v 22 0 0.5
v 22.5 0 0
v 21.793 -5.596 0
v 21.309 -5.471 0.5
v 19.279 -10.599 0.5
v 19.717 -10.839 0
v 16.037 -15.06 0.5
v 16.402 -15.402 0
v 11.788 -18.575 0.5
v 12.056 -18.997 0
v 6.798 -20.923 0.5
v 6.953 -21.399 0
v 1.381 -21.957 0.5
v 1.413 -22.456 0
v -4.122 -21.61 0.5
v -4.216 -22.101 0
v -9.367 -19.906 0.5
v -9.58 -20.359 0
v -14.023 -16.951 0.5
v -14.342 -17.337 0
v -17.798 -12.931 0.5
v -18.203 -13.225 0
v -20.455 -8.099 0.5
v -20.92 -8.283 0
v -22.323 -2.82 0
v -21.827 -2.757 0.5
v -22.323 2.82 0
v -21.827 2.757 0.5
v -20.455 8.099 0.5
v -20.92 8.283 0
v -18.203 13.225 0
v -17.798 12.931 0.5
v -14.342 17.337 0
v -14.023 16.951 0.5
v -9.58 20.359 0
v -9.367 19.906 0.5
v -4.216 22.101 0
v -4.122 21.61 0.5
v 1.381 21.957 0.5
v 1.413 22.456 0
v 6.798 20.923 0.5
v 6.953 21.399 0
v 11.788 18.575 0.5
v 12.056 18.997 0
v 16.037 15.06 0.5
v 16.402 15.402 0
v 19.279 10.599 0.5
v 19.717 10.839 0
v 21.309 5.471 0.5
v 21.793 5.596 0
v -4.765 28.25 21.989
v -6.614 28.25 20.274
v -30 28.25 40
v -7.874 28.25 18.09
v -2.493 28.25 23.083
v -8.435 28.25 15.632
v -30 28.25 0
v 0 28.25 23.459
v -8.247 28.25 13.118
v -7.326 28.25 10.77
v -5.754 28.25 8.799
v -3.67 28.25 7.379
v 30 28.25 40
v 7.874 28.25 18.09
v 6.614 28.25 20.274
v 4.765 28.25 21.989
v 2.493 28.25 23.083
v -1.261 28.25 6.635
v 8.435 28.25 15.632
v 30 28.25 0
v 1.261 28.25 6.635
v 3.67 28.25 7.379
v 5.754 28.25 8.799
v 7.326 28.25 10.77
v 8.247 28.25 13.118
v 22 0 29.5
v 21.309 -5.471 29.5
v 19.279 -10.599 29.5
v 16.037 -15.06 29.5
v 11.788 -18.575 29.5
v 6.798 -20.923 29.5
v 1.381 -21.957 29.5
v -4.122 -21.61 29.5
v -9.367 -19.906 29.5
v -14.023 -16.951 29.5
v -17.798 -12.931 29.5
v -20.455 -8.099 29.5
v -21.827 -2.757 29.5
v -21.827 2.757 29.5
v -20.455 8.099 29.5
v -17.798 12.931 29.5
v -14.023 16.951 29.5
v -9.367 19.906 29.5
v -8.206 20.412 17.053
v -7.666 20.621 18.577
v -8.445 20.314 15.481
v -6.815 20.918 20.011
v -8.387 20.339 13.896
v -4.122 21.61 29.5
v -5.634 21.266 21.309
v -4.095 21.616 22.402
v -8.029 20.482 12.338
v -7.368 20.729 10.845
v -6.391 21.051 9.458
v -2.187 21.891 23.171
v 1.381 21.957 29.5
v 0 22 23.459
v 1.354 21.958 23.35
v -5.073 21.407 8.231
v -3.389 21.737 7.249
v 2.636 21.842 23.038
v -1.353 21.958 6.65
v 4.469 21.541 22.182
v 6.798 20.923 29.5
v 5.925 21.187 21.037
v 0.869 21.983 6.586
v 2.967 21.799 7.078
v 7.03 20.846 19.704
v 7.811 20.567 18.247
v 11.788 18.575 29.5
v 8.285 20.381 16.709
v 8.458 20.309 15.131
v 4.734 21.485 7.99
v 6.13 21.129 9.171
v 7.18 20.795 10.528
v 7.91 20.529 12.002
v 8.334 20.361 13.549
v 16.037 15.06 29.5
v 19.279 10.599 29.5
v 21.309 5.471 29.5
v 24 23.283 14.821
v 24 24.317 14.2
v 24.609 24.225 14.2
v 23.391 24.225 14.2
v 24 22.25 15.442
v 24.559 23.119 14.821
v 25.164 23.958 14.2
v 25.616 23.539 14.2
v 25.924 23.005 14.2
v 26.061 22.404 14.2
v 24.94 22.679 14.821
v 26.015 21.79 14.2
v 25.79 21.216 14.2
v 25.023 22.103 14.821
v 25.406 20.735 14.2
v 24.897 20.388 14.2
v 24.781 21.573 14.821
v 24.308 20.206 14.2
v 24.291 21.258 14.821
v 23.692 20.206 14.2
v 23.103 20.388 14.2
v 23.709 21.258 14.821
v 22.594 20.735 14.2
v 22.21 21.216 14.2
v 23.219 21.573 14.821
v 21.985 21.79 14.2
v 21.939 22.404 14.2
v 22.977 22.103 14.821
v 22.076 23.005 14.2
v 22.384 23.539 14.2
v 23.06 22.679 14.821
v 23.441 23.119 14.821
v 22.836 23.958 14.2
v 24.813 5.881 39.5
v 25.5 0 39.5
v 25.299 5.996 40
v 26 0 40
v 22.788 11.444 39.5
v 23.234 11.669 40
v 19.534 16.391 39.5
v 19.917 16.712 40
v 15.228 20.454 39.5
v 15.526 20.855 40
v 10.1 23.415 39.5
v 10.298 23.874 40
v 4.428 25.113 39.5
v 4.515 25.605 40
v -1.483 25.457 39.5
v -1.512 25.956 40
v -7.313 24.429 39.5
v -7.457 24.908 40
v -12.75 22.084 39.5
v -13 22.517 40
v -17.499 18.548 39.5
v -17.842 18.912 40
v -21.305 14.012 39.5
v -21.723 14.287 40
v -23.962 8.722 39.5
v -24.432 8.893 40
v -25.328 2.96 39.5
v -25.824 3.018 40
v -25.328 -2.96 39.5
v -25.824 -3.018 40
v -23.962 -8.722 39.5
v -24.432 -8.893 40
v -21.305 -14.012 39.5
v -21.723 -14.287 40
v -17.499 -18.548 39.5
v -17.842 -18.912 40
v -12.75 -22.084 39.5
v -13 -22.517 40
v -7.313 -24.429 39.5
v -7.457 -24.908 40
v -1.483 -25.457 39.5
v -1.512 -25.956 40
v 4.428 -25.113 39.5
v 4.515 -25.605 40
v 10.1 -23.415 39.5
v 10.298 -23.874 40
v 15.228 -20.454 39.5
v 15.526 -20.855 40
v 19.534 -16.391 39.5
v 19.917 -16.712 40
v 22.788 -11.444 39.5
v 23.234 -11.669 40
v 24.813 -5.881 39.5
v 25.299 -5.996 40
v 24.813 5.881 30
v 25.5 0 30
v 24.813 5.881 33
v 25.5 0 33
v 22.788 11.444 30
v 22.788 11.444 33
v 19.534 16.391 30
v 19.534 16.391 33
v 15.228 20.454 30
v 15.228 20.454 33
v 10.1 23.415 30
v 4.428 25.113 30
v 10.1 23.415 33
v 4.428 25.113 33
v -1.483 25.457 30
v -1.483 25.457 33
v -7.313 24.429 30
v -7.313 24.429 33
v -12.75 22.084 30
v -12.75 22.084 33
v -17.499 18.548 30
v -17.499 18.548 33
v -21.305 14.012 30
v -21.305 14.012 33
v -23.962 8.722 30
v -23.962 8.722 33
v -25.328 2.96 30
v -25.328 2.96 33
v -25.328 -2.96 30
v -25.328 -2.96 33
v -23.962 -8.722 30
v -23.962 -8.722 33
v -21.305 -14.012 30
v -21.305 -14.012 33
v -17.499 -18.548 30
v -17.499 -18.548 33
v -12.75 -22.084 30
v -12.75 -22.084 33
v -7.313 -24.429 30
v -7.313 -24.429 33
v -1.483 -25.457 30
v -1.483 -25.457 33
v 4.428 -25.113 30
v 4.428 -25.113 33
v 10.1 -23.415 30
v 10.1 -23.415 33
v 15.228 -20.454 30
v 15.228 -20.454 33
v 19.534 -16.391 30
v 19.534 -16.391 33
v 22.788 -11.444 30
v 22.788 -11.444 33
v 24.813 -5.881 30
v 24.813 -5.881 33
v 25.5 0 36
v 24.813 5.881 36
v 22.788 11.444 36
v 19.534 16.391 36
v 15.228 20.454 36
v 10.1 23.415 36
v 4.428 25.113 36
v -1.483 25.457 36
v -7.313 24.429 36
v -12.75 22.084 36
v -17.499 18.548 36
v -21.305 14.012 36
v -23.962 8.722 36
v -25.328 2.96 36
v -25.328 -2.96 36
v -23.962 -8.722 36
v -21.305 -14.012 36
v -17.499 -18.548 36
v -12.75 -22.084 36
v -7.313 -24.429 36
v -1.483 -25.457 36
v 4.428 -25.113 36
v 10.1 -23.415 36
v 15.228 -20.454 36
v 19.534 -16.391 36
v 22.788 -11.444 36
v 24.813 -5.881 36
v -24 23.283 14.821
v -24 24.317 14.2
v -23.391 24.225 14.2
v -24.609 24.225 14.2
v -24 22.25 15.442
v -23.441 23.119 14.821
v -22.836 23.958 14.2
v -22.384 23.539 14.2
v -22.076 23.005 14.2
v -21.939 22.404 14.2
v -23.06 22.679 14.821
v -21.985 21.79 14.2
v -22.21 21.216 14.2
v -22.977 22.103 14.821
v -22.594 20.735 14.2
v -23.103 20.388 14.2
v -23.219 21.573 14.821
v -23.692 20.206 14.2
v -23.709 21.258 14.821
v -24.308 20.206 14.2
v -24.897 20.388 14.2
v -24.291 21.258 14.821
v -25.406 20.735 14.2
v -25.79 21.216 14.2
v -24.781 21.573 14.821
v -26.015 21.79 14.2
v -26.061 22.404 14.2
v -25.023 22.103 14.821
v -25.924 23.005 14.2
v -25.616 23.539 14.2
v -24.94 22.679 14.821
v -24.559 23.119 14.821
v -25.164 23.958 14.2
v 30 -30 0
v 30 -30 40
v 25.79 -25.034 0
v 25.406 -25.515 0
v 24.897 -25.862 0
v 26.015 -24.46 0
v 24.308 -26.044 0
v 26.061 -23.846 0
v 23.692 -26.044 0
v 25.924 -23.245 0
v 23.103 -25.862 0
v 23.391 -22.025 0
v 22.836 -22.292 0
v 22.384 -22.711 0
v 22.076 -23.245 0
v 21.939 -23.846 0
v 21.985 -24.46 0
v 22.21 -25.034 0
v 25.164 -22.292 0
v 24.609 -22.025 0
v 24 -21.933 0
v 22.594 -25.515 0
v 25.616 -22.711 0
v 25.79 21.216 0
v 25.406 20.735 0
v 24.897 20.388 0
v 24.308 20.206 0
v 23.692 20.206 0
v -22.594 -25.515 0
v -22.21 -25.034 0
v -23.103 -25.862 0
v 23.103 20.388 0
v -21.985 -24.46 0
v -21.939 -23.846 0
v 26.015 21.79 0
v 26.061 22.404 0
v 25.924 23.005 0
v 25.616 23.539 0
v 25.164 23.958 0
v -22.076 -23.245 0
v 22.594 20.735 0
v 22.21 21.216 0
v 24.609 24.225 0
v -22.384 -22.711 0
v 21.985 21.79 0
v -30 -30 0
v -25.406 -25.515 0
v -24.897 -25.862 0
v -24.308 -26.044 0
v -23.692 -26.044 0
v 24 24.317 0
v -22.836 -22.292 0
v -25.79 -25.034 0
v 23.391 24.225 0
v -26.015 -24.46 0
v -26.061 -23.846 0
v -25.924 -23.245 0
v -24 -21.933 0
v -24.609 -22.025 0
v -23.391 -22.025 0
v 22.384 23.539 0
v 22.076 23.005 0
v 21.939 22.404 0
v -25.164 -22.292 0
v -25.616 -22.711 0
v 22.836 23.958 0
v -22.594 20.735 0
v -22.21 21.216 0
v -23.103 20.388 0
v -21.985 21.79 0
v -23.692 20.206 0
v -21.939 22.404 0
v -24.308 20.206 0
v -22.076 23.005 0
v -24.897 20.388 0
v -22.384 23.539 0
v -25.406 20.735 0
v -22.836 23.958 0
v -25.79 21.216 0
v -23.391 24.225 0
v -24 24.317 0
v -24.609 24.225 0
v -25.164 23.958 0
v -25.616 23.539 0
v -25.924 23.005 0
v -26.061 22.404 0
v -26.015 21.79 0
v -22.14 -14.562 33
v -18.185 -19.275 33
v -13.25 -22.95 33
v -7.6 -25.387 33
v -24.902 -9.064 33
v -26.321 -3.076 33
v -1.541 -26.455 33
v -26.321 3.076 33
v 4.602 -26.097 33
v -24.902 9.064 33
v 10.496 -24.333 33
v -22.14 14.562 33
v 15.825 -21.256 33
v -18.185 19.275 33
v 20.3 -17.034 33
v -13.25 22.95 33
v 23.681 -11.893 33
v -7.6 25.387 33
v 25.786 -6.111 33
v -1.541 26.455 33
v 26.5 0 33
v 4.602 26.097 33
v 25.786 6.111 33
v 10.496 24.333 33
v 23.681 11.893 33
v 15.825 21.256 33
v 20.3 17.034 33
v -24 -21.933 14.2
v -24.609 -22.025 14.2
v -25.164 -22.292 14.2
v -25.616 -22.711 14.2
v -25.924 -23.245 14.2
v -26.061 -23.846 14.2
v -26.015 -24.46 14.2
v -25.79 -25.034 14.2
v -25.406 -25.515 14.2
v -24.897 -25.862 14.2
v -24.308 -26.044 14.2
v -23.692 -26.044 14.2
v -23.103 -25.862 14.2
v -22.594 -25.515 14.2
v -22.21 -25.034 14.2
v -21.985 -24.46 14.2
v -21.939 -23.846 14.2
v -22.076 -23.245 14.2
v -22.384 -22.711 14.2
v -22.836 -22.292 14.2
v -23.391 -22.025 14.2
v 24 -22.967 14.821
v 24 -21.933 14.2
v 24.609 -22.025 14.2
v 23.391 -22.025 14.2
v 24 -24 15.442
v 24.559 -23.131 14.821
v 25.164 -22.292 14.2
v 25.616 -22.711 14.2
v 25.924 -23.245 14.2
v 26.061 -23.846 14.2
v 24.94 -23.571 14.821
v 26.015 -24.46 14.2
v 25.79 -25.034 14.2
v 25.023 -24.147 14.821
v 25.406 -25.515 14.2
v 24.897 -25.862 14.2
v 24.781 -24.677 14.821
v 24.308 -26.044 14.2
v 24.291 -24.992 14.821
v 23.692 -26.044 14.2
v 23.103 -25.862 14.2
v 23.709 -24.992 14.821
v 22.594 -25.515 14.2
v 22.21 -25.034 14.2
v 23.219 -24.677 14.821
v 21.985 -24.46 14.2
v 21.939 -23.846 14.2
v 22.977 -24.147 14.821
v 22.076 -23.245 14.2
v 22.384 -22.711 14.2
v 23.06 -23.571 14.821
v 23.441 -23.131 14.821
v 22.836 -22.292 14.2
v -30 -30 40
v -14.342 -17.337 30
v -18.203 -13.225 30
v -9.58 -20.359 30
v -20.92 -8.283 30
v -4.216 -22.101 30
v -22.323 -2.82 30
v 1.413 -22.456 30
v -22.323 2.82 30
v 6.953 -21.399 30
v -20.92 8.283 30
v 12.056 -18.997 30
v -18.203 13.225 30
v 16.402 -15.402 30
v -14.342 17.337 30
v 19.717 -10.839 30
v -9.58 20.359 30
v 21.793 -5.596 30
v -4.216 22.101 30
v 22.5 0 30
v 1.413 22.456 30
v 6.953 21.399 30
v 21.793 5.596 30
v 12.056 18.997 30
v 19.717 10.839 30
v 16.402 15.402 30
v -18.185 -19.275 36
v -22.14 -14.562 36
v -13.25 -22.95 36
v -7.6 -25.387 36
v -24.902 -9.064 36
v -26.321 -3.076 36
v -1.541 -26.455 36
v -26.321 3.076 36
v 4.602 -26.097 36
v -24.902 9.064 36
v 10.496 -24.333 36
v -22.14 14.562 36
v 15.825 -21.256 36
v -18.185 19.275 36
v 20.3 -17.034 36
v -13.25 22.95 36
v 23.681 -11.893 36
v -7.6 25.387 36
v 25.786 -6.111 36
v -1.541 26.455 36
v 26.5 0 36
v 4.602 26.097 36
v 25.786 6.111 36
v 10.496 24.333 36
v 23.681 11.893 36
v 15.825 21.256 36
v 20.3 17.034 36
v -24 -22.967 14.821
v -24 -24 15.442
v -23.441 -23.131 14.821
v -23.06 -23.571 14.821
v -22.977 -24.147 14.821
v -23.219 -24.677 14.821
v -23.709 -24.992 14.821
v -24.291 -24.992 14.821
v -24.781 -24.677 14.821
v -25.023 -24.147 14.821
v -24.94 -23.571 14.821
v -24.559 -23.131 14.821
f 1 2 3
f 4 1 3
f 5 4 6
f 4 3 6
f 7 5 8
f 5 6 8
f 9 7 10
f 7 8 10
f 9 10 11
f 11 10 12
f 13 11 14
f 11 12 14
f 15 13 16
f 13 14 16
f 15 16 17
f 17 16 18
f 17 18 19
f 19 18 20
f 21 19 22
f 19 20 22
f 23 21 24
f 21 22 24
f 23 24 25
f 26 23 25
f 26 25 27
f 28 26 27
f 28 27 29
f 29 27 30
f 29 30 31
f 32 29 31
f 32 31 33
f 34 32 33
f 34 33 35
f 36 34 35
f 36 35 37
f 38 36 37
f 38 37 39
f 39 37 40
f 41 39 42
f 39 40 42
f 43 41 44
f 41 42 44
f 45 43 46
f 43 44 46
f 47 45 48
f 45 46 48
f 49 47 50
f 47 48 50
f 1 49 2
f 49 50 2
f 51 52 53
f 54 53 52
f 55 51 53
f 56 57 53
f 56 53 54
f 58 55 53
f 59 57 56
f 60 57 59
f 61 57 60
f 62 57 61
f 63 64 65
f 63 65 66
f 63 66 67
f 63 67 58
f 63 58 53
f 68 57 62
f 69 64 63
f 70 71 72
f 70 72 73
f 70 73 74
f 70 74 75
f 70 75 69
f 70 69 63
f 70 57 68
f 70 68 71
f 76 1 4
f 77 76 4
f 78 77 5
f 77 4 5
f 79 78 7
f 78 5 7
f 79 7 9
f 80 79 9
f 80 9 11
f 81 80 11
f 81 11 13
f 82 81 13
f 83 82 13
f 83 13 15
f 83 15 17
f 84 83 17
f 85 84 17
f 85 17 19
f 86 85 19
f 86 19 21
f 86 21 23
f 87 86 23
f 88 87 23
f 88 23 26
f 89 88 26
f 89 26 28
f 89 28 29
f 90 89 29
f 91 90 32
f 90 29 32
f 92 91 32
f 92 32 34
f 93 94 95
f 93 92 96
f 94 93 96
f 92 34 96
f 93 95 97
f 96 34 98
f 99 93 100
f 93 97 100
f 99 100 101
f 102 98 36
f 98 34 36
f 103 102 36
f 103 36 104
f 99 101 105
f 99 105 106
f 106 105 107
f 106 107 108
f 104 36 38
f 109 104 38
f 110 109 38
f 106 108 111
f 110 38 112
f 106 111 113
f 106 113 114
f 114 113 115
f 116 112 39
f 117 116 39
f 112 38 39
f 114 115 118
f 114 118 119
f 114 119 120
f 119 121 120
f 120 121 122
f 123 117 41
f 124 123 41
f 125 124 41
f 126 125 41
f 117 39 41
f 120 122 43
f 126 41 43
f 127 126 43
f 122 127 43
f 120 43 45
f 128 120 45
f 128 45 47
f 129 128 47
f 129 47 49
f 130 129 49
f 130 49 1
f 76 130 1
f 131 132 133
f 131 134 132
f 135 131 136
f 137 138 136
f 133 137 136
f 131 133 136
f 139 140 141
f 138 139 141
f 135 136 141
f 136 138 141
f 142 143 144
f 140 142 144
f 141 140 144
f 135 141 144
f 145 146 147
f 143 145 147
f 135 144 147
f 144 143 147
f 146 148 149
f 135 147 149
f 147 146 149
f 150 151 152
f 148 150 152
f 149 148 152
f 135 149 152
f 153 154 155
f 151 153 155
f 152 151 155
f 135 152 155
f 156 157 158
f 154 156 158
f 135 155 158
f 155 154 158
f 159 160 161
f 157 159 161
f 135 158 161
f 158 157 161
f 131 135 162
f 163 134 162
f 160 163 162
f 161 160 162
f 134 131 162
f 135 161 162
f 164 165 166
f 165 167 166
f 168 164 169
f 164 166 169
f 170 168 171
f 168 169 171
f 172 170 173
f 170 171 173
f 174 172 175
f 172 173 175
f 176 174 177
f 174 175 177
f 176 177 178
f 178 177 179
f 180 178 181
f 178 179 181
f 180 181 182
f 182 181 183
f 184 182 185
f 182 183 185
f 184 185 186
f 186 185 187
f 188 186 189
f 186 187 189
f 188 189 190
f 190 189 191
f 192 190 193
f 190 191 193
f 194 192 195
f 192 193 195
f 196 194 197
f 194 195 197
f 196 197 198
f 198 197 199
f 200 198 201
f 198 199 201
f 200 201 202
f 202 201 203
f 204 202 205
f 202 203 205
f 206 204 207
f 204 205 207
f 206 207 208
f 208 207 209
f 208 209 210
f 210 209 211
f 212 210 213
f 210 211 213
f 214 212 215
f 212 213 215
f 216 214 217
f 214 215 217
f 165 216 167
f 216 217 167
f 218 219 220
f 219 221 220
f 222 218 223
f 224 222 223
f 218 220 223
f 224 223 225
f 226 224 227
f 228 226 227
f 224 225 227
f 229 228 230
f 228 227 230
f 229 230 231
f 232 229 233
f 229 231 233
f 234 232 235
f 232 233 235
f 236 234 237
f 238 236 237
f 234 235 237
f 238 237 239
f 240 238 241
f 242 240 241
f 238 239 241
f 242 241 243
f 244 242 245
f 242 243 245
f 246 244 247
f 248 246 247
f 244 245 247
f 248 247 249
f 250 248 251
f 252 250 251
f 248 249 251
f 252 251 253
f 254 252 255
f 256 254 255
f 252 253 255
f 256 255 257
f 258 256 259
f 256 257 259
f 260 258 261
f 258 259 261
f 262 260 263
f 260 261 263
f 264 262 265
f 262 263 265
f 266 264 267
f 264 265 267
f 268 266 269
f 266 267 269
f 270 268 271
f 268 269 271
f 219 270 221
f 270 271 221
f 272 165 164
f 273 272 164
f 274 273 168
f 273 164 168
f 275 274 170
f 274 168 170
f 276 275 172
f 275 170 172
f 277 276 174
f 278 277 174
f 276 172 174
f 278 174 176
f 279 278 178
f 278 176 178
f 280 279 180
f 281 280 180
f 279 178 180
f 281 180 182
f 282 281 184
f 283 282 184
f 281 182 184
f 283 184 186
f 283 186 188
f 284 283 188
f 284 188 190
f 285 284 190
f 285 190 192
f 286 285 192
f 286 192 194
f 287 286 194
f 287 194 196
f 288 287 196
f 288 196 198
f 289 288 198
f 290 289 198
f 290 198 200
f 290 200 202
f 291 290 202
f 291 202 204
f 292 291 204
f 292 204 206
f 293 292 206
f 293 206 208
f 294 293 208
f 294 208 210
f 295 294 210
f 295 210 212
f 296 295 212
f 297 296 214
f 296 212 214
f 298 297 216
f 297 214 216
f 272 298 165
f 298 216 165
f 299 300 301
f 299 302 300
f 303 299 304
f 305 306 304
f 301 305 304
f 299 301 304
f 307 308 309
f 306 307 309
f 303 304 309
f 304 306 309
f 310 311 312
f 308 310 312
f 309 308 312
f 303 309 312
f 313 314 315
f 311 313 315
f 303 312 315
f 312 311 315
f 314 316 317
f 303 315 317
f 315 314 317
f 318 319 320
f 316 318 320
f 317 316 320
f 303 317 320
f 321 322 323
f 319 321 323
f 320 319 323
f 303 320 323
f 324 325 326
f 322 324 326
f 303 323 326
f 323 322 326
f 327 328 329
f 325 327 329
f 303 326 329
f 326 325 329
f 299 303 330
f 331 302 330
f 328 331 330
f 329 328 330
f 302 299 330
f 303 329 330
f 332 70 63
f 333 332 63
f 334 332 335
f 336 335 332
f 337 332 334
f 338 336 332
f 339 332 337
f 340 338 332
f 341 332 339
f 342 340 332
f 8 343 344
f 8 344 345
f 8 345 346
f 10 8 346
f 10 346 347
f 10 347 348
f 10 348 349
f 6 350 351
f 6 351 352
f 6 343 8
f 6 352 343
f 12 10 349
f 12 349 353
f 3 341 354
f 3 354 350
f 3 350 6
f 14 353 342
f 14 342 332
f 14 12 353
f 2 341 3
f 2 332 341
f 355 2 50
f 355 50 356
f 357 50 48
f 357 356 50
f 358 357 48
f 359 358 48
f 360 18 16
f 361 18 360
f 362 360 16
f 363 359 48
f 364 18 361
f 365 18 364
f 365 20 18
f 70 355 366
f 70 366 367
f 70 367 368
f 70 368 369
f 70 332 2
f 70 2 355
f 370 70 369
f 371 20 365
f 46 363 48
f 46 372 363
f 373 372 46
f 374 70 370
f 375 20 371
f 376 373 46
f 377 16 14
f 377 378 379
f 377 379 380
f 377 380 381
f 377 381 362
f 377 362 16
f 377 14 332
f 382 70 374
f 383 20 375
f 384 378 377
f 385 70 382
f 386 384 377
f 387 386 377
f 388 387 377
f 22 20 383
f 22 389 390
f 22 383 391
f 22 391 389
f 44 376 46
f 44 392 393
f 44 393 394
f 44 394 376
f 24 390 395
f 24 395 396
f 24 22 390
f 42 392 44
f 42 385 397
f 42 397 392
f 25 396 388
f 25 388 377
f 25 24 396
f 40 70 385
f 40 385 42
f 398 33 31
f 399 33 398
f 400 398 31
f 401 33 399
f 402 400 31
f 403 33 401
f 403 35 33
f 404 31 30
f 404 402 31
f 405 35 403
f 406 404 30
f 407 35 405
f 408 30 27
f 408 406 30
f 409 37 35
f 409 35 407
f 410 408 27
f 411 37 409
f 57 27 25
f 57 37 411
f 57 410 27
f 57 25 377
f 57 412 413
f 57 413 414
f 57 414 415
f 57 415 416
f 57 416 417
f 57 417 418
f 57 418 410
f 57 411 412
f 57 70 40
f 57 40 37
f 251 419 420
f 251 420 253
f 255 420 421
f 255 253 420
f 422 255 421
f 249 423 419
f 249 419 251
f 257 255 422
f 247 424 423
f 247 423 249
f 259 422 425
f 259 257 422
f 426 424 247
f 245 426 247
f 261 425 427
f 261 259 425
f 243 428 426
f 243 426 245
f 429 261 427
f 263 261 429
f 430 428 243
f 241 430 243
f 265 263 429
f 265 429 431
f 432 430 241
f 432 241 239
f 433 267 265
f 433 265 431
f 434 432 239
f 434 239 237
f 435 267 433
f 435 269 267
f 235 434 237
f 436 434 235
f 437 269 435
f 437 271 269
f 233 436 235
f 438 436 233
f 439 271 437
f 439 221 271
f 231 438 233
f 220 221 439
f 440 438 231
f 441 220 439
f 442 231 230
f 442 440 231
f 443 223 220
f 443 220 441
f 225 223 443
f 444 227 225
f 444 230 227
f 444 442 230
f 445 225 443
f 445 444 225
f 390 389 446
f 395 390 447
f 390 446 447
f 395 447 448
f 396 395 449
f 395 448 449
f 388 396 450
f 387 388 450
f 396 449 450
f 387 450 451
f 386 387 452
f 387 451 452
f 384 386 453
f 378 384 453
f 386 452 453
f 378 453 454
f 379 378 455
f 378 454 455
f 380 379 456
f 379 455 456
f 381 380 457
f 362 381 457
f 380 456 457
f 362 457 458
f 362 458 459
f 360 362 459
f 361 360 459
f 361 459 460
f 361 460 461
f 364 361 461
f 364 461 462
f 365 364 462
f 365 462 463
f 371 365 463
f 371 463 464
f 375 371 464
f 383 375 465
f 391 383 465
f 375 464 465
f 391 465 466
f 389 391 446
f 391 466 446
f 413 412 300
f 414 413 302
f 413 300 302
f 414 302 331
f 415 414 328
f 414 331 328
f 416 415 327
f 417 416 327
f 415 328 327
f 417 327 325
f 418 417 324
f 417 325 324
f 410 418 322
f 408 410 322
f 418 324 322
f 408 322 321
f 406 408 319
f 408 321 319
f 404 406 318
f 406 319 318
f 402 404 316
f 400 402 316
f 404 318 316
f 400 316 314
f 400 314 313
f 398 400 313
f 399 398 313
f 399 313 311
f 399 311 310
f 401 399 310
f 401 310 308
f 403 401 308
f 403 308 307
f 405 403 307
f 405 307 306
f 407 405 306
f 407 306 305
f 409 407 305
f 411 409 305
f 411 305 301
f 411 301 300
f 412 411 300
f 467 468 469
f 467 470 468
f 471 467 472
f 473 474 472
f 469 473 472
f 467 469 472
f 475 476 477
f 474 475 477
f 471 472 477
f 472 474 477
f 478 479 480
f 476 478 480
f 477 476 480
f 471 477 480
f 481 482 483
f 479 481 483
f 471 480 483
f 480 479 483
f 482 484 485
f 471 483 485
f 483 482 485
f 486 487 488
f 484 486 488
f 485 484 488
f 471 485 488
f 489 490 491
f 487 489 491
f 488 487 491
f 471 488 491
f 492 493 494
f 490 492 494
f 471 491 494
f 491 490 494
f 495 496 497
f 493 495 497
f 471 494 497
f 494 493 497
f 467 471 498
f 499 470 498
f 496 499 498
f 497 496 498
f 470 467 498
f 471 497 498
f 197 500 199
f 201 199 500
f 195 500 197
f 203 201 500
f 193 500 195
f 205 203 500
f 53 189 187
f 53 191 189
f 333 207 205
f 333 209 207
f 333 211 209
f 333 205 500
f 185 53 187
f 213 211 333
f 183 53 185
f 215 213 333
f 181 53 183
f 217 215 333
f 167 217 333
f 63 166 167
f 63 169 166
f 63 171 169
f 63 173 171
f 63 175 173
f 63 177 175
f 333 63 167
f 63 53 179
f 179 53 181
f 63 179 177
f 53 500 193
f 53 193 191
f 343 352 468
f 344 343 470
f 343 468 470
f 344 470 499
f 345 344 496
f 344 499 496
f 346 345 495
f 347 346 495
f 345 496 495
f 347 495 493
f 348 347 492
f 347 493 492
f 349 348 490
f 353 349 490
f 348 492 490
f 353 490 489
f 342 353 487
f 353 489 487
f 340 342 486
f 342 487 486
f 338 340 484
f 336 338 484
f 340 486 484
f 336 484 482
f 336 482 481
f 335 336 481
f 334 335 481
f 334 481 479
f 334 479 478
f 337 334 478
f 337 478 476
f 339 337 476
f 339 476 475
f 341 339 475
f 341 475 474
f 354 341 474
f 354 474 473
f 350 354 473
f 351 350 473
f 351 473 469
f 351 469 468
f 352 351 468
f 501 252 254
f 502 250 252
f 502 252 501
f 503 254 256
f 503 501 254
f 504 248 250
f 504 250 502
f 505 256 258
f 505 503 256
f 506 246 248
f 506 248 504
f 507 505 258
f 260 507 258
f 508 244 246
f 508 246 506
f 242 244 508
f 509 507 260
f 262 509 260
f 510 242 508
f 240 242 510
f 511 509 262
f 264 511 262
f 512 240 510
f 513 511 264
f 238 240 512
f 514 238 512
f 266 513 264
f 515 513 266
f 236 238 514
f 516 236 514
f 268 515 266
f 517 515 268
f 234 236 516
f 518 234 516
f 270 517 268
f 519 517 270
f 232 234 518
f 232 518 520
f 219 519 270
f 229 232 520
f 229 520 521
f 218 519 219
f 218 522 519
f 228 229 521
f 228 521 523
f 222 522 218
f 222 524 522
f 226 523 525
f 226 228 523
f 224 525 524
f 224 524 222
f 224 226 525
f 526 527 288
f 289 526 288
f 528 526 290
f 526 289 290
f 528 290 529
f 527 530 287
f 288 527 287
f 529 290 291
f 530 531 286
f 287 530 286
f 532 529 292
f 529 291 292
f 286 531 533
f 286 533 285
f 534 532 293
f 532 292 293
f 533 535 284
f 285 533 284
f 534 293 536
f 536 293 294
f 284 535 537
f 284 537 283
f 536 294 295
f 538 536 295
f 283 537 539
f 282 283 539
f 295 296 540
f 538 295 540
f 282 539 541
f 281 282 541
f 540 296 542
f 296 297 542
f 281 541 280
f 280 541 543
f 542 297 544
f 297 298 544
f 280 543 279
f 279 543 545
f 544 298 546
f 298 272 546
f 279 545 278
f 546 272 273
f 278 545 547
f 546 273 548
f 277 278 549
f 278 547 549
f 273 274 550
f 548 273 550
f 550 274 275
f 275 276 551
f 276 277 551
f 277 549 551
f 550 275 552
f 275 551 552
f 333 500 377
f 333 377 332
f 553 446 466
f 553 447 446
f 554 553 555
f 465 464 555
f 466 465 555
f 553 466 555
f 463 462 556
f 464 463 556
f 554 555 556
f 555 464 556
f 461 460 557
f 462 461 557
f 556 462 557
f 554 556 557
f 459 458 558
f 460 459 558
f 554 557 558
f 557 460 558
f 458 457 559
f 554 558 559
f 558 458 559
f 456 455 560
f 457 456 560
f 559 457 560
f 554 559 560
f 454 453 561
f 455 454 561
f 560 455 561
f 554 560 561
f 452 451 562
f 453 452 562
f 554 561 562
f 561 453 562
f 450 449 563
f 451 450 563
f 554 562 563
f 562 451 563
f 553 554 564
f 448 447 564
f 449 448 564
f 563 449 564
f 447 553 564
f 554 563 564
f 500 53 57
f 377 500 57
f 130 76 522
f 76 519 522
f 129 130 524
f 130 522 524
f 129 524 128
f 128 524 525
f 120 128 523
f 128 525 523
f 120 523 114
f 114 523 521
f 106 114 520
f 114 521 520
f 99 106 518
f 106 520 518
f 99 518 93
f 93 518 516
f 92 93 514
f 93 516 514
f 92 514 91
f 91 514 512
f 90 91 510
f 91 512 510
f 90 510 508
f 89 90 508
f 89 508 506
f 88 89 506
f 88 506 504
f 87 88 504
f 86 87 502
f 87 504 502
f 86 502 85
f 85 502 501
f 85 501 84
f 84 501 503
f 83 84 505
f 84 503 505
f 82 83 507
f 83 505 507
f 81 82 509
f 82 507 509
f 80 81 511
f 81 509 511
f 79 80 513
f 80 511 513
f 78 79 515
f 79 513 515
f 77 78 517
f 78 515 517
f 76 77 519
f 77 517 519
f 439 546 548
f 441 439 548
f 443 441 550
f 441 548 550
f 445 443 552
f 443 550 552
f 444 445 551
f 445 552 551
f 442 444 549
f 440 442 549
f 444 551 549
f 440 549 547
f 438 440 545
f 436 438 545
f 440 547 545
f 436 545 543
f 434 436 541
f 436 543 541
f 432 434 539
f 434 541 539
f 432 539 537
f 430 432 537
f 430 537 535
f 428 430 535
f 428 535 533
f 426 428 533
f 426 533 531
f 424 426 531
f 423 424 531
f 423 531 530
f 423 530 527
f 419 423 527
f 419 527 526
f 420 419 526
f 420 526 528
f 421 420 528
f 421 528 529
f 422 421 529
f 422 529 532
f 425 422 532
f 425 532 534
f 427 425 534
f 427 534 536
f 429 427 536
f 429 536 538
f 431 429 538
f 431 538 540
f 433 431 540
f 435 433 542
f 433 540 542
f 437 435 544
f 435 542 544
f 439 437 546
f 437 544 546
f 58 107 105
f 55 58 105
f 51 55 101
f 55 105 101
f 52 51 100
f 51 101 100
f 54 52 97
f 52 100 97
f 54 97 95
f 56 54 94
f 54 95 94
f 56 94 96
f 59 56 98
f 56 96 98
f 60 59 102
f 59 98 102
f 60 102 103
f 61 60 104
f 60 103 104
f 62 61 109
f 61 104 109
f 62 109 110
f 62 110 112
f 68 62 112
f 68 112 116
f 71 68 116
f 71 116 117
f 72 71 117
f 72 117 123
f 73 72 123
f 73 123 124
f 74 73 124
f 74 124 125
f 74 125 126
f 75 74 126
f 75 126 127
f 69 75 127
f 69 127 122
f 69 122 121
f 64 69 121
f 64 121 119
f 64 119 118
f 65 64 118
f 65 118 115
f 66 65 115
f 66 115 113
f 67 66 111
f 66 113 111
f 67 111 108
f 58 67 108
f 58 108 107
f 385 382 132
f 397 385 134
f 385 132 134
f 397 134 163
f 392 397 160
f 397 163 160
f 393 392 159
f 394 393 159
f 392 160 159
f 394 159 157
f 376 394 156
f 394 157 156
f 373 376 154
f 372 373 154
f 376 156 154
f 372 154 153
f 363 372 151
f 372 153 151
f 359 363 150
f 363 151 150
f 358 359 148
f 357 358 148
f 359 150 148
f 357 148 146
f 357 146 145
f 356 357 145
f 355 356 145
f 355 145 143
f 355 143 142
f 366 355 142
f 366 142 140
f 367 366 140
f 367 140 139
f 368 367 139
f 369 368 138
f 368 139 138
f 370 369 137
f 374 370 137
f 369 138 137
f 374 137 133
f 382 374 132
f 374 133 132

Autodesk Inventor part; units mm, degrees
ref_plane "YZ Plane" through (0, 0, 0) normal (1, 0, 0) x (0, 1, 0)
ref_plane "XZ Plane" through (0, 0, 0) normal (0, 1, 0) x (-1, 0, 0)
ref_plane "XY Plane" through (0, 0, 0) normal (0, 0, 1) x (1, 0, 0)
sketch "Skizze5" plane through (0, 0, 0) normal (0, 0, 1) x (1, 0, 0)
  circle A0 centre (0, 0) radius 22
  line L0 (-30, 28.25) -> (30, 28.25)
  line L1 (30, 28.25) -> (30, -28.25)
  line L2 (30, -28.25) -> (-30, -28.25)
  line L3 (-30, -28.25) -> (-30, 28.25)
  dimension "d26" = 44
  dimension "d27" = 60
  dimension "d28" = 56.5
  dimension "d29" = 30
  dimension "d30" = 28.25
extrude "Extrusion2" add sketch "Skizze5" along normal blind 40
sketch "Skizze6" plane through (-30, 28.25, 0) normal (0, 1, 0) x (1, 0, 0)
  line L0 (60, -40) -> (0, -40) projected
  line L1 (60, 0) -> (60, -40) projected
  point P0 (30, 0)
  point P1 (30, -15)
  dimension "d34" = 30
  dimension "d73" = 15
hole "Bohrung3" at (0, 28.25, 15) direction (0, -1, 0) diameter 16.918 depth 41.1 tip angle 118 thread size "M18x1" class "6H" standard "ISO Metric profile"
sketch "Skizze7" plane through (0, 0, 40) normal (0, 0, 1) x (1, 0, 0)
  circle A0 centre (0, 0) radius 25.5
  dimension "d42" = 51
extrude "Extrusion3" cut sketch "Skizze7" against normal blind 10
chamfer "Fase1" distance 0.5 angle 45 3 edges at (-25.5, 0, 40) (-22, 0, 30) (-22, 0, 0)
sketch "Skizze9" plane through (0, 0, 0) normal (0, 0, -1) x (-1, 0, 0)
  line L0 (30, 28.25) -> (-30, 28.25) projected
  line L1 (30, -28.25) -> (30, 28.25) projected
  point P0 (0, 0)
  point P1 (-24, -24)
  point P2 (-24, 22.25)
  point P3 (24, 22.25)
  point P4 (24, -24)
  dimension "d77" = 46.25
  dimension "d78" = 48
  dimension "d79" = 6
  dimension "d80" = 6
hole "Bohrung6" at (24, -24, 0) at (24, 22.25, 0) at (-24, 22.25, 0) at (-24, -24, 0) direction (0, 0, 1) diameter 4.134 depth 14.2 tip angle 118 thread size "M5x0.8" class "6H" standard "ISO Metric profile"
sketch "Skizze10" plane through (-30, -28.25, 0) normal (0, -1, 0) x (1, 0, 0)
  line L0 (60, 0) -> (0, 0) projected
  line L1 (0, 40) -> (60, 40) projected
  line L2 (0, 0) -> (60, 0)
  line L3 (60, 0) -> (60, 40)
  line L4 (60, 40) -> (0, 40)
  line L5 (0, 40) -> (0, 0)
  point P0 (30, 0)
extrude "Extrusion4" add sketch "Skizze10" along normal blind 1.75
sketch "Skizze11" plane through (0, 0, 0) normal (0, 1, 0) x (-1, 0, 0)
  line L0 (-26.5, 36) -> (-25, 36)
  line L1 (-25, 36) -> (-25, 33)
  line L2 (-25, 33) -> (-26.5, 33)
  line L3 (-26.5, 33) -> (-26.5, 36)
  line L4 (0, -8) -> (0, 48) projected
  point P0 (0, 0)
  dimension "d90" = 1.5
  dimension "d91" = 25
  dimension "d92" = 33
  dimension "d93" = 3
revolve "Umdrehung1" cut sketch "Skizze11" angle 360 about axis through (0, 0, -10) along (0, 0, 1)
equation "\"d29\" = 0.5 * d27"
equation "\"d30\" = 0.5 * d28"
properties part number "Sensoraufnahme" material "Aluminium 6061"
